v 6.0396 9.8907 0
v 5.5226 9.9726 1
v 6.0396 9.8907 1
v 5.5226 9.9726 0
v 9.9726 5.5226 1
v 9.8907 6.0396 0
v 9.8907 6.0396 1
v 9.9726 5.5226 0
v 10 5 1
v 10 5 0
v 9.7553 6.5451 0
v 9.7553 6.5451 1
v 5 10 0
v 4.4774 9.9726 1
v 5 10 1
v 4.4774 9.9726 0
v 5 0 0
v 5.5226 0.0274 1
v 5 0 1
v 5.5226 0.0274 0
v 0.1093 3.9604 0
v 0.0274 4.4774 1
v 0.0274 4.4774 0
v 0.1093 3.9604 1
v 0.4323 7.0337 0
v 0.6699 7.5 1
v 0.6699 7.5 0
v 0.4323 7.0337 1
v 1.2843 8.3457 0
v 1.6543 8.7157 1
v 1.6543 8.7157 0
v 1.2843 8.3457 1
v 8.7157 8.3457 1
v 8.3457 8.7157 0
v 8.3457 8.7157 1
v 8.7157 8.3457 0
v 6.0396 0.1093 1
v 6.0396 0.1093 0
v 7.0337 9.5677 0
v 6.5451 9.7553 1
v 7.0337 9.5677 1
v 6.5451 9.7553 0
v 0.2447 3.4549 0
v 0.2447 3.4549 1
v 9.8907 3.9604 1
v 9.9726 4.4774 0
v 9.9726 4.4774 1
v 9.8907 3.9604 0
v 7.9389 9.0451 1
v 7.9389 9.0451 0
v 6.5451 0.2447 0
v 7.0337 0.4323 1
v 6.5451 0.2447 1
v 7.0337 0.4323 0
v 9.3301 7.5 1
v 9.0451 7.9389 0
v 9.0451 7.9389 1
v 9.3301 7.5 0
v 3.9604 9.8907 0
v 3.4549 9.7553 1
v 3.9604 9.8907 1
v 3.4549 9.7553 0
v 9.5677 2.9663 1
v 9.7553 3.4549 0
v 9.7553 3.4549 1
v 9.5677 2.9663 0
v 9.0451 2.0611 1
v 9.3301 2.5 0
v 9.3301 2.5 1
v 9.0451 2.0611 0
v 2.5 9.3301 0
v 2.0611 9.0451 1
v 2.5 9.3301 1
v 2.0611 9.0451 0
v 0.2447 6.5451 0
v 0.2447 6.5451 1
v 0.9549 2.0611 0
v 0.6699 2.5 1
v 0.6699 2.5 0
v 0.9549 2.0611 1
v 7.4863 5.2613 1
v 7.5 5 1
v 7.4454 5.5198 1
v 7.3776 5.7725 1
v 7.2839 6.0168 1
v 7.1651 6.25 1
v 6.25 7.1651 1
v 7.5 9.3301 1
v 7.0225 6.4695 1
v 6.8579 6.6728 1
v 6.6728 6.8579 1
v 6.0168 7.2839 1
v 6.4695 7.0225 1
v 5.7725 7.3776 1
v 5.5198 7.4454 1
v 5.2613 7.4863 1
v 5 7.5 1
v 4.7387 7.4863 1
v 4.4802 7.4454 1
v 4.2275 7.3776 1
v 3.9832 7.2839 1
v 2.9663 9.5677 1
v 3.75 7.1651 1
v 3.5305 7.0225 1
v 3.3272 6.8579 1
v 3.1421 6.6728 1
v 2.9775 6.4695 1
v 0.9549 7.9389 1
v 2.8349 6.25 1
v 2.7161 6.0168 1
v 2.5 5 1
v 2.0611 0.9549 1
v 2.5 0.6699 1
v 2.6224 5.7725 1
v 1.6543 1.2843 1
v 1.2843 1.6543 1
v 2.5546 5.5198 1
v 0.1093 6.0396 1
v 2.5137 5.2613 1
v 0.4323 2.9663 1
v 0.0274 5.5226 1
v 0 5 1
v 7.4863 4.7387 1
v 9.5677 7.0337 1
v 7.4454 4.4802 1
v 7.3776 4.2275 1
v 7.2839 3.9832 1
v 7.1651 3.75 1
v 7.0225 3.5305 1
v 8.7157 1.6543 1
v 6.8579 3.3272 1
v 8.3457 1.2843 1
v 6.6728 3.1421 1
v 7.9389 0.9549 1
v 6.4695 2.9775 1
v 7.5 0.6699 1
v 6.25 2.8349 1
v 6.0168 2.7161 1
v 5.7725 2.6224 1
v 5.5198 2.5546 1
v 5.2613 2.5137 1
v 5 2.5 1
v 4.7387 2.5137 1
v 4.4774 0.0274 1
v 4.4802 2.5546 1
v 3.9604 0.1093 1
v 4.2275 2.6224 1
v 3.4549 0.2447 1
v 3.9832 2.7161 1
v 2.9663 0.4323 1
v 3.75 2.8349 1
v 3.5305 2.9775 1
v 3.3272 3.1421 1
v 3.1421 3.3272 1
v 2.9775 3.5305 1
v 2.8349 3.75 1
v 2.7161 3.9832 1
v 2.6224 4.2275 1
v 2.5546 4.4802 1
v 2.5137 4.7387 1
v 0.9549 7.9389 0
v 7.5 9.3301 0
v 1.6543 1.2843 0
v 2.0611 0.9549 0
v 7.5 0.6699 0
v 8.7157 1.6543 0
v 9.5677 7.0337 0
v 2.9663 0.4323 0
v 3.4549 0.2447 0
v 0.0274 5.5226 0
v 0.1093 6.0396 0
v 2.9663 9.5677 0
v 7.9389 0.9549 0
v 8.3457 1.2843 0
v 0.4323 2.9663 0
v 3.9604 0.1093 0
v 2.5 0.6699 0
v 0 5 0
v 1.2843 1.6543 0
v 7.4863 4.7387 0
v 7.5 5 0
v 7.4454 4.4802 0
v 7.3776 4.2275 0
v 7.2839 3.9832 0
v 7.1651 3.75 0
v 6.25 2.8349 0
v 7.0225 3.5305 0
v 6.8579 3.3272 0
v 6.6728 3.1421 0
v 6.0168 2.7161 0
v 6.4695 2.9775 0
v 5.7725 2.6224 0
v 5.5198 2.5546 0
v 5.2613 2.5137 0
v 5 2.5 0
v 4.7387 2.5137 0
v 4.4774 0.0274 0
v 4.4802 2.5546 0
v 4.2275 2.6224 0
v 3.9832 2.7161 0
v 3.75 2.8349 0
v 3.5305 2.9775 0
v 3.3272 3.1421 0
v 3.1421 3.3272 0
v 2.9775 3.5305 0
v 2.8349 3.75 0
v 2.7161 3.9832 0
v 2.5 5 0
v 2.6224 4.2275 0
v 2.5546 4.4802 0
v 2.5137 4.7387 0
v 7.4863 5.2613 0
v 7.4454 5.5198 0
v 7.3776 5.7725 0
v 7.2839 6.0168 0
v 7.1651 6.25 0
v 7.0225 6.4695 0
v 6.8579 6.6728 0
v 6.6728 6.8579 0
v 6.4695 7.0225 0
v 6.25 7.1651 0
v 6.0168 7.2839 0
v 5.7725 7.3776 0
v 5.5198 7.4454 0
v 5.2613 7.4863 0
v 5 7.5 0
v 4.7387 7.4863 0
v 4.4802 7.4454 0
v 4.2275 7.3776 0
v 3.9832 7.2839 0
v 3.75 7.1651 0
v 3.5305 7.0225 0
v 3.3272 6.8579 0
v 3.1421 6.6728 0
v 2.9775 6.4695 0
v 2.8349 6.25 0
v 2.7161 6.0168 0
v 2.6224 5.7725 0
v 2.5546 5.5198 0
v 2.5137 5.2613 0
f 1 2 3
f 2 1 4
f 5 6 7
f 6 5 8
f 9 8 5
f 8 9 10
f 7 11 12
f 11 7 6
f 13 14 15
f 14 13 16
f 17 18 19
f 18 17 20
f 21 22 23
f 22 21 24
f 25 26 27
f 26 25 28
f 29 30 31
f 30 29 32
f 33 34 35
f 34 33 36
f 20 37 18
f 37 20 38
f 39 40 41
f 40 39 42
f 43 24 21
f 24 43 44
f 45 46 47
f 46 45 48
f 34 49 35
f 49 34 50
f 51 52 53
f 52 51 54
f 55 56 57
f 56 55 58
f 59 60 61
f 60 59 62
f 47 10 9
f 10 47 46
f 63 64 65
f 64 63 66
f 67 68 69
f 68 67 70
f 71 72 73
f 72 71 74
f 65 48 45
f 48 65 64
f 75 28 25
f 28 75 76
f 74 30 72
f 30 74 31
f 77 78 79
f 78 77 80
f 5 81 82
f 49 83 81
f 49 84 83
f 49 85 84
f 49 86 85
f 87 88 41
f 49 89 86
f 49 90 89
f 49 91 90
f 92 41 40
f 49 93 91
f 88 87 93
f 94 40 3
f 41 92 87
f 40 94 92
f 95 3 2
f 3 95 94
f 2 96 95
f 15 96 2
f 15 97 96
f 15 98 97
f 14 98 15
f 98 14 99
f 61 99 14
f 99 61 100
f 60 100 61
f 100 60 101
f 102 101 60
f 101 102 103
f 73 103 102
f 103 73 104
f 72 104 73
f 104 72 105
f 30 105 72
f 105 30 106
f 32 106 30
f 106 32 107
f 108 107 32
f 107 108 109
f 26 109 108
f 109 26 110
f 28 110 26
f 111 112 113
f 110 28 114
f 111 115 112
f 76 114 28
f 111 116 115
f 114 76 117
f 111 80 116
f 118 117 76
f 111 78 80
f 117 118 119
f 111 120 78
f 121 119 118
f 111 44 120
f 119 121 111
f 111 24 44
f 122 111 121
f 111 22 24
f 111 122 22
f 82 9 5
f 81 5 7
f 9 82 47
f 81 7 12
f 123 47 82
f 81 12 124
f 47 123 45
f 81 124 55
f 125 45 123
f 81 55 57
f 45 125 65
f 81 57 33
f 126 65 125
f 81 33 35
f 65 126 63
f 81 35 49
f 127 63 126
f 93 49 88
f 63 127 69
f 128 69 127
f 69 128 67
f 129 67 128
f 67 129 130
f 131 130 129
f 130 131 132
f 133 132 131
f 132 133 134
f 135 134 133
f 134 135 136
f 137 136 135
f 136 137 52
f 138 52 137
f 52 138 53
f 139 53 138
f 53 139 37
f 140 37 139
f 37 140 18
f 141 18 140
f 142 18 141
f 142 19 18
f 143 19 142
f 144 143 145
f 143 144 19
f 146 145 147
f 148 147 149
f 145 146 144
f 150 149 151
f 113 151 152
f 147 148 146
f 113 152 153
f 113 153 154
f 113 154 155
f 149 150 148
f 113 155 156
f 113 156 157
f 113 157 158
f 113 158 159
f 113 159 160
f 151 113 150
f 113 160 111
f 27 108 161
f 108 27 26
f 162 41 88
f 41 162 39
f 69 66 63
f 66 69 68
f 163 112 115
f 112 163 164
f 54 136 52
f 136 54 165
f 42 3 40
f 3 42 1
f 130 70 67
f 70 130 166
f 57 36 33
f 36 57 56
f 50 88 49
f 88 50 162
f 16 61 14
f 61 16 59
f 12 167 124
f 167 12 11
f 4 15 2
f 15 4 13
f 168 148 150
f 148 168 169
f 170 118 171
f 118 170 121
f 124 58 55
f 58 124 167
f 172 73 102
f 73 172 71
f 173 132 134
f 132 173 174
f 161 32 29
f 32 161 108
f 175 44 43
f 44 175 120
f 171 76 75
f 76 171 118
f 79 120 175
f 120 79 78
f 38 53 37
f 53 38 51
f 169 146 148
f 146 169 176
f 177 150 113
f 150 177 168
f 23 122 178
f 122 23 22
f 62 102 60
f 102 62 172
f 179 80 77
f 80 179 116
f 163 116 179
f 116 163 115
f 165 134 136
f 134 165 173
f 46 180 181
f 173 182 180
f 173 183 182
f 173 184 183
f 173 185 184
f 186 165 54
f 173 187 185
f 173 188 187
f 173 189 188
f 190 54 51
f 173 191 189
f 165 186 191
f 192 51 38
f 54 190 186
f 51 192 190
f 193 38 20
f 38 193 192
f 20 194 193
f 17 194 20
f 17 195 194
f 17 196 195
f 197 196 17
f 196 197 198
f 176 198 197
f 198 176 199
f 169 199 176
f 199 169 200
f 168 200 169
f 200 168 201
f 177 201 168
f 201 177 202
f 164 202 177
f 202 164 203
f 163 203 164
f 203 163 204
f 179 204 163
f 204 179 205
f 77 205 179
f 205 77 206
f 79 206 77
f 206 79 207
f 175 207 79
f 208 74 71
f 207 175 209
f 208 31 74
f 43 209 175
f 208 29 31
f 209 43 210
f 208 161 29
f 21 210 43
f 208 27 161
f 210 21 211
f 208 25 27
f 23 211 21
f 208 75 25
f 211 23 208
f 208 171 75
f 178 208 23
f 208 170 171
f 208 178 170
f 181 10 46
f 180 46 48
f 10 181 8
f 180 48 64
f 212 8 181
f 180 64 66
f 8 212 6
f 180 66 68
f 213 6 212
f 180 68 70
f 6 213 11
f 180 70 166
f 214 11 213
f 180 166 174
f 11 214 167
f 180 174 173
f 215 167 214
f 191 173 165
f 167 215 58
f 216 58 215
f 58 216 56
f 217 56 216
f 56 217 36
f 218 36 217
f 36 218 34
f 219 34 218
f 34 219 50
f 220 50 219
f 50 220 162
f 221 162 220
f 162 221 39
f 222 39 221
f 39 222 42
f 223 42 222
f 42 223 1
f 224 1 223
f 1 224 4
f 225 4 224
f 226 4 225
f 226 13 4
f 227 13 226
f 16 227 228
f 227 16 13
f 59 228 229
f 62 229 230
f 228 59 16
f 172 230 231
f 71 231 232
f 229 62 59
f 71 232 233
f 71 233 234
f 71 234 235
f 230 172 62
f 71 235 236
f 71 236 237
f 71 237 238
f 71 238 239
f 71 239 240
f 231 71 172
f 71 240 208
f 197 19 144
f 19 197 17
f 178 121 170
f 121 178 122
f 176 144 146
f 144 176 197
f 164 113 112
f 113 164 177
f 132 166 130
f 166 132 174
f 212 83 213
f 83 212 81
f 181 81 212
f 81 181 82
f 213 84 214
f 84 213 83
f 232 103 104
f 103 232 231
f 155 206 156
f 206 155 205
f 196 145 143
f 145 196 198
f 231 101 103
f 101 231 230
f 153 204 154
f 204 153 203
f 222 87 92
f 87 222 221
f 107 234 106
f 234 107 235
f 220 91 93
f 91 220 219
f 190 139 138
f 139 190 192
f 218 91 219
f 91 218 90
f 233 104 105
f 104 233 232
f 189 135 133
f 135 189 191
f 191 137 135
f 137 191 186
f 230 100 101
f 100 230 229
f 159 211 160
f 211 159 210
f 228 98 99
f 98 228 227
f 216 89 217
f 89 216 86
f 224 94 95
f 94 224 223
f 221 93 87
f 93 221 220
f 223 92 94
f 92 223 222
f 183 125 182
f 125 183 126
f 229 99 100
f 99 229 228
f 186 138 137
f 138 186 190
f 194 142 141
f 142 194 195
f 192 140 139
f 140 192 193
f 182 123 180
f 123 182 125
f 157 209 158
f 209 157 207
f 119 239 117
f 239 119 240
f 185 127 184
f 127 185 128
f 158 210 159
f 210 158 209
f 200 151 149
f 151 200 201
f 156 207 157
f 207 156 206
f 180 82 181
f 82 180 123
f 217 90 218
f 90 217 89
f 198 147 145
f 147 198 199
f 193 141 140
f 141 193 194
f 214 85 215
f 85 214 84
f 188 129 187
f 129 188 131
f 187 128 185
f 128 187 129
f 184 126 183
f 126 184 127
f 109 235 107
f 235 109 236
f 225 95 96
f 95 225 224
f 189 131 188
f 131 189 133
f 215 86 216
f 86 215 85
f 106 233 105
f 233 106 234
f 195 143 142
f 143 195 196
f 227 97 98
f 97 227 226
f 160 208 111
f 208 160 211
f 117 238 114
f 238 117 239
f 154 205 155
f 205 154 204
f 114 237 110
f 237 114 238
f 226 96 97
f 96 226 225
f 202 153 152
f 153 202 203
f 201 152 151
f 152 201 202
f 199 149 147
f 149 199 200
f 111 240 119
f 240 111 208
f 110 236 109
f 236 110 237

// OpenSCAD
// OpenSCAD: washer 10x5x1 — flat washer
// Версия: v1.0 — initial

// Краткое описание (для таблицы моделей)
description = "Flat washer OD 10mm, ID 5mm, thickness 1mm";

// Общие модули
use <../modules.scad>;

// ===== Точность аппроксимации окружностей =====
$fn = 0;        // фиксированную сегментацию отключаем
$fa = 6;        // 5–8° обычно достаточно
$fs = 0.35;     // ≈ диаметр сопла (0.3–0.5 для сопла 0.4)
pin_fs = 0.25;  // чуть тоньше для штырей и отверстий

// ===== Режим печати тест‑фрагментов =====
test_fragment = false;   // true — печатать только угловые фрагменты
frag_size     = 20;      // размер квадрата вырезки, мм
frag_index    = 0;       // 0=НЛ, 1=ВЛ, 2=НП, 3=ВП
frag_gap_x    = 10;      // зазор между фрагментами по X, мм
frag_h_extra  = 20;      // запас по высоте клипа, мм

// ===== Общие доп. параметры =====
tiny = 0.1;               // небольшой зазор для булевых операций
edge_chamfer_z = 0;       // высота фаски по Z (мм) — для шайбы сверху
edge_chamfer_x = 0;       // не используется для круглой шайбы
edge_chamfer_y = 0;       // не используется для круглой шайбы
screen_frame_gap = 0.2;   // запас по высоте для вычитаний (не влияет на XY)

// ===== Параметры модели =====
outer_d    = 10;   // внешний диаметр, мм
inner_d    = 5;    // внутренний диаметр, мм
thickness  = 1;    // толщина шайбы, мм

// Производные размеры
base_h = thickness;   // высота основной детали, мм (для клиппера)

// ===== Комментарии =============================================
/*
Модель: простая плоская шайба (кольцо) с настраиваемой фаской по верхней кромке.
Фрагменты:
- base — основная шайба

Поддержка тест‑фрагментов: при test_fragment=true выводится клип по углу
квадратом frag_size×frag_size на высоту base_h.
*/

// ===== Модули деталей ==========================================
module base() {
  ch = clamp_chz(thickness, edge_chamfer_z);
  if (ch > 0) {
    // Кольцо с верхней фаской
    chamfer_ring(d_outer=outer_d, d_inner=inner_d, h=thickness, chamfer=ch);
  } else {
    // Прямое кольцо без фаски
    difference() {
      cylinder(h=thickness, d=outer_d);
      translate([0,0,-tiny]) cylinder(h=thickness + 2*tiny, d=inner_d, $fs=pin_fs, $fa=6);
    }
  }
}

// ===== Вывод всех фрагментов ==================================
module show_all() {
  clip_for_fragments_bbox(
    L=outer_d,
    W=outer_d,
    H=base_h,
    enabled=test_fragment,
    frag_size=frag_size,
    frag_index=frag_index,
    frag_h_extra=frag_h_extra
  ) {
    // Переносим в положительные X,Y, чтобы bbox-клиппер брал углы [0..L,0..W]
    translate([outer_d/2, outer_d/2, 0]) base();
  }
}

// ===== Точка входа =============================================
module main() { show_all(); }
main();
